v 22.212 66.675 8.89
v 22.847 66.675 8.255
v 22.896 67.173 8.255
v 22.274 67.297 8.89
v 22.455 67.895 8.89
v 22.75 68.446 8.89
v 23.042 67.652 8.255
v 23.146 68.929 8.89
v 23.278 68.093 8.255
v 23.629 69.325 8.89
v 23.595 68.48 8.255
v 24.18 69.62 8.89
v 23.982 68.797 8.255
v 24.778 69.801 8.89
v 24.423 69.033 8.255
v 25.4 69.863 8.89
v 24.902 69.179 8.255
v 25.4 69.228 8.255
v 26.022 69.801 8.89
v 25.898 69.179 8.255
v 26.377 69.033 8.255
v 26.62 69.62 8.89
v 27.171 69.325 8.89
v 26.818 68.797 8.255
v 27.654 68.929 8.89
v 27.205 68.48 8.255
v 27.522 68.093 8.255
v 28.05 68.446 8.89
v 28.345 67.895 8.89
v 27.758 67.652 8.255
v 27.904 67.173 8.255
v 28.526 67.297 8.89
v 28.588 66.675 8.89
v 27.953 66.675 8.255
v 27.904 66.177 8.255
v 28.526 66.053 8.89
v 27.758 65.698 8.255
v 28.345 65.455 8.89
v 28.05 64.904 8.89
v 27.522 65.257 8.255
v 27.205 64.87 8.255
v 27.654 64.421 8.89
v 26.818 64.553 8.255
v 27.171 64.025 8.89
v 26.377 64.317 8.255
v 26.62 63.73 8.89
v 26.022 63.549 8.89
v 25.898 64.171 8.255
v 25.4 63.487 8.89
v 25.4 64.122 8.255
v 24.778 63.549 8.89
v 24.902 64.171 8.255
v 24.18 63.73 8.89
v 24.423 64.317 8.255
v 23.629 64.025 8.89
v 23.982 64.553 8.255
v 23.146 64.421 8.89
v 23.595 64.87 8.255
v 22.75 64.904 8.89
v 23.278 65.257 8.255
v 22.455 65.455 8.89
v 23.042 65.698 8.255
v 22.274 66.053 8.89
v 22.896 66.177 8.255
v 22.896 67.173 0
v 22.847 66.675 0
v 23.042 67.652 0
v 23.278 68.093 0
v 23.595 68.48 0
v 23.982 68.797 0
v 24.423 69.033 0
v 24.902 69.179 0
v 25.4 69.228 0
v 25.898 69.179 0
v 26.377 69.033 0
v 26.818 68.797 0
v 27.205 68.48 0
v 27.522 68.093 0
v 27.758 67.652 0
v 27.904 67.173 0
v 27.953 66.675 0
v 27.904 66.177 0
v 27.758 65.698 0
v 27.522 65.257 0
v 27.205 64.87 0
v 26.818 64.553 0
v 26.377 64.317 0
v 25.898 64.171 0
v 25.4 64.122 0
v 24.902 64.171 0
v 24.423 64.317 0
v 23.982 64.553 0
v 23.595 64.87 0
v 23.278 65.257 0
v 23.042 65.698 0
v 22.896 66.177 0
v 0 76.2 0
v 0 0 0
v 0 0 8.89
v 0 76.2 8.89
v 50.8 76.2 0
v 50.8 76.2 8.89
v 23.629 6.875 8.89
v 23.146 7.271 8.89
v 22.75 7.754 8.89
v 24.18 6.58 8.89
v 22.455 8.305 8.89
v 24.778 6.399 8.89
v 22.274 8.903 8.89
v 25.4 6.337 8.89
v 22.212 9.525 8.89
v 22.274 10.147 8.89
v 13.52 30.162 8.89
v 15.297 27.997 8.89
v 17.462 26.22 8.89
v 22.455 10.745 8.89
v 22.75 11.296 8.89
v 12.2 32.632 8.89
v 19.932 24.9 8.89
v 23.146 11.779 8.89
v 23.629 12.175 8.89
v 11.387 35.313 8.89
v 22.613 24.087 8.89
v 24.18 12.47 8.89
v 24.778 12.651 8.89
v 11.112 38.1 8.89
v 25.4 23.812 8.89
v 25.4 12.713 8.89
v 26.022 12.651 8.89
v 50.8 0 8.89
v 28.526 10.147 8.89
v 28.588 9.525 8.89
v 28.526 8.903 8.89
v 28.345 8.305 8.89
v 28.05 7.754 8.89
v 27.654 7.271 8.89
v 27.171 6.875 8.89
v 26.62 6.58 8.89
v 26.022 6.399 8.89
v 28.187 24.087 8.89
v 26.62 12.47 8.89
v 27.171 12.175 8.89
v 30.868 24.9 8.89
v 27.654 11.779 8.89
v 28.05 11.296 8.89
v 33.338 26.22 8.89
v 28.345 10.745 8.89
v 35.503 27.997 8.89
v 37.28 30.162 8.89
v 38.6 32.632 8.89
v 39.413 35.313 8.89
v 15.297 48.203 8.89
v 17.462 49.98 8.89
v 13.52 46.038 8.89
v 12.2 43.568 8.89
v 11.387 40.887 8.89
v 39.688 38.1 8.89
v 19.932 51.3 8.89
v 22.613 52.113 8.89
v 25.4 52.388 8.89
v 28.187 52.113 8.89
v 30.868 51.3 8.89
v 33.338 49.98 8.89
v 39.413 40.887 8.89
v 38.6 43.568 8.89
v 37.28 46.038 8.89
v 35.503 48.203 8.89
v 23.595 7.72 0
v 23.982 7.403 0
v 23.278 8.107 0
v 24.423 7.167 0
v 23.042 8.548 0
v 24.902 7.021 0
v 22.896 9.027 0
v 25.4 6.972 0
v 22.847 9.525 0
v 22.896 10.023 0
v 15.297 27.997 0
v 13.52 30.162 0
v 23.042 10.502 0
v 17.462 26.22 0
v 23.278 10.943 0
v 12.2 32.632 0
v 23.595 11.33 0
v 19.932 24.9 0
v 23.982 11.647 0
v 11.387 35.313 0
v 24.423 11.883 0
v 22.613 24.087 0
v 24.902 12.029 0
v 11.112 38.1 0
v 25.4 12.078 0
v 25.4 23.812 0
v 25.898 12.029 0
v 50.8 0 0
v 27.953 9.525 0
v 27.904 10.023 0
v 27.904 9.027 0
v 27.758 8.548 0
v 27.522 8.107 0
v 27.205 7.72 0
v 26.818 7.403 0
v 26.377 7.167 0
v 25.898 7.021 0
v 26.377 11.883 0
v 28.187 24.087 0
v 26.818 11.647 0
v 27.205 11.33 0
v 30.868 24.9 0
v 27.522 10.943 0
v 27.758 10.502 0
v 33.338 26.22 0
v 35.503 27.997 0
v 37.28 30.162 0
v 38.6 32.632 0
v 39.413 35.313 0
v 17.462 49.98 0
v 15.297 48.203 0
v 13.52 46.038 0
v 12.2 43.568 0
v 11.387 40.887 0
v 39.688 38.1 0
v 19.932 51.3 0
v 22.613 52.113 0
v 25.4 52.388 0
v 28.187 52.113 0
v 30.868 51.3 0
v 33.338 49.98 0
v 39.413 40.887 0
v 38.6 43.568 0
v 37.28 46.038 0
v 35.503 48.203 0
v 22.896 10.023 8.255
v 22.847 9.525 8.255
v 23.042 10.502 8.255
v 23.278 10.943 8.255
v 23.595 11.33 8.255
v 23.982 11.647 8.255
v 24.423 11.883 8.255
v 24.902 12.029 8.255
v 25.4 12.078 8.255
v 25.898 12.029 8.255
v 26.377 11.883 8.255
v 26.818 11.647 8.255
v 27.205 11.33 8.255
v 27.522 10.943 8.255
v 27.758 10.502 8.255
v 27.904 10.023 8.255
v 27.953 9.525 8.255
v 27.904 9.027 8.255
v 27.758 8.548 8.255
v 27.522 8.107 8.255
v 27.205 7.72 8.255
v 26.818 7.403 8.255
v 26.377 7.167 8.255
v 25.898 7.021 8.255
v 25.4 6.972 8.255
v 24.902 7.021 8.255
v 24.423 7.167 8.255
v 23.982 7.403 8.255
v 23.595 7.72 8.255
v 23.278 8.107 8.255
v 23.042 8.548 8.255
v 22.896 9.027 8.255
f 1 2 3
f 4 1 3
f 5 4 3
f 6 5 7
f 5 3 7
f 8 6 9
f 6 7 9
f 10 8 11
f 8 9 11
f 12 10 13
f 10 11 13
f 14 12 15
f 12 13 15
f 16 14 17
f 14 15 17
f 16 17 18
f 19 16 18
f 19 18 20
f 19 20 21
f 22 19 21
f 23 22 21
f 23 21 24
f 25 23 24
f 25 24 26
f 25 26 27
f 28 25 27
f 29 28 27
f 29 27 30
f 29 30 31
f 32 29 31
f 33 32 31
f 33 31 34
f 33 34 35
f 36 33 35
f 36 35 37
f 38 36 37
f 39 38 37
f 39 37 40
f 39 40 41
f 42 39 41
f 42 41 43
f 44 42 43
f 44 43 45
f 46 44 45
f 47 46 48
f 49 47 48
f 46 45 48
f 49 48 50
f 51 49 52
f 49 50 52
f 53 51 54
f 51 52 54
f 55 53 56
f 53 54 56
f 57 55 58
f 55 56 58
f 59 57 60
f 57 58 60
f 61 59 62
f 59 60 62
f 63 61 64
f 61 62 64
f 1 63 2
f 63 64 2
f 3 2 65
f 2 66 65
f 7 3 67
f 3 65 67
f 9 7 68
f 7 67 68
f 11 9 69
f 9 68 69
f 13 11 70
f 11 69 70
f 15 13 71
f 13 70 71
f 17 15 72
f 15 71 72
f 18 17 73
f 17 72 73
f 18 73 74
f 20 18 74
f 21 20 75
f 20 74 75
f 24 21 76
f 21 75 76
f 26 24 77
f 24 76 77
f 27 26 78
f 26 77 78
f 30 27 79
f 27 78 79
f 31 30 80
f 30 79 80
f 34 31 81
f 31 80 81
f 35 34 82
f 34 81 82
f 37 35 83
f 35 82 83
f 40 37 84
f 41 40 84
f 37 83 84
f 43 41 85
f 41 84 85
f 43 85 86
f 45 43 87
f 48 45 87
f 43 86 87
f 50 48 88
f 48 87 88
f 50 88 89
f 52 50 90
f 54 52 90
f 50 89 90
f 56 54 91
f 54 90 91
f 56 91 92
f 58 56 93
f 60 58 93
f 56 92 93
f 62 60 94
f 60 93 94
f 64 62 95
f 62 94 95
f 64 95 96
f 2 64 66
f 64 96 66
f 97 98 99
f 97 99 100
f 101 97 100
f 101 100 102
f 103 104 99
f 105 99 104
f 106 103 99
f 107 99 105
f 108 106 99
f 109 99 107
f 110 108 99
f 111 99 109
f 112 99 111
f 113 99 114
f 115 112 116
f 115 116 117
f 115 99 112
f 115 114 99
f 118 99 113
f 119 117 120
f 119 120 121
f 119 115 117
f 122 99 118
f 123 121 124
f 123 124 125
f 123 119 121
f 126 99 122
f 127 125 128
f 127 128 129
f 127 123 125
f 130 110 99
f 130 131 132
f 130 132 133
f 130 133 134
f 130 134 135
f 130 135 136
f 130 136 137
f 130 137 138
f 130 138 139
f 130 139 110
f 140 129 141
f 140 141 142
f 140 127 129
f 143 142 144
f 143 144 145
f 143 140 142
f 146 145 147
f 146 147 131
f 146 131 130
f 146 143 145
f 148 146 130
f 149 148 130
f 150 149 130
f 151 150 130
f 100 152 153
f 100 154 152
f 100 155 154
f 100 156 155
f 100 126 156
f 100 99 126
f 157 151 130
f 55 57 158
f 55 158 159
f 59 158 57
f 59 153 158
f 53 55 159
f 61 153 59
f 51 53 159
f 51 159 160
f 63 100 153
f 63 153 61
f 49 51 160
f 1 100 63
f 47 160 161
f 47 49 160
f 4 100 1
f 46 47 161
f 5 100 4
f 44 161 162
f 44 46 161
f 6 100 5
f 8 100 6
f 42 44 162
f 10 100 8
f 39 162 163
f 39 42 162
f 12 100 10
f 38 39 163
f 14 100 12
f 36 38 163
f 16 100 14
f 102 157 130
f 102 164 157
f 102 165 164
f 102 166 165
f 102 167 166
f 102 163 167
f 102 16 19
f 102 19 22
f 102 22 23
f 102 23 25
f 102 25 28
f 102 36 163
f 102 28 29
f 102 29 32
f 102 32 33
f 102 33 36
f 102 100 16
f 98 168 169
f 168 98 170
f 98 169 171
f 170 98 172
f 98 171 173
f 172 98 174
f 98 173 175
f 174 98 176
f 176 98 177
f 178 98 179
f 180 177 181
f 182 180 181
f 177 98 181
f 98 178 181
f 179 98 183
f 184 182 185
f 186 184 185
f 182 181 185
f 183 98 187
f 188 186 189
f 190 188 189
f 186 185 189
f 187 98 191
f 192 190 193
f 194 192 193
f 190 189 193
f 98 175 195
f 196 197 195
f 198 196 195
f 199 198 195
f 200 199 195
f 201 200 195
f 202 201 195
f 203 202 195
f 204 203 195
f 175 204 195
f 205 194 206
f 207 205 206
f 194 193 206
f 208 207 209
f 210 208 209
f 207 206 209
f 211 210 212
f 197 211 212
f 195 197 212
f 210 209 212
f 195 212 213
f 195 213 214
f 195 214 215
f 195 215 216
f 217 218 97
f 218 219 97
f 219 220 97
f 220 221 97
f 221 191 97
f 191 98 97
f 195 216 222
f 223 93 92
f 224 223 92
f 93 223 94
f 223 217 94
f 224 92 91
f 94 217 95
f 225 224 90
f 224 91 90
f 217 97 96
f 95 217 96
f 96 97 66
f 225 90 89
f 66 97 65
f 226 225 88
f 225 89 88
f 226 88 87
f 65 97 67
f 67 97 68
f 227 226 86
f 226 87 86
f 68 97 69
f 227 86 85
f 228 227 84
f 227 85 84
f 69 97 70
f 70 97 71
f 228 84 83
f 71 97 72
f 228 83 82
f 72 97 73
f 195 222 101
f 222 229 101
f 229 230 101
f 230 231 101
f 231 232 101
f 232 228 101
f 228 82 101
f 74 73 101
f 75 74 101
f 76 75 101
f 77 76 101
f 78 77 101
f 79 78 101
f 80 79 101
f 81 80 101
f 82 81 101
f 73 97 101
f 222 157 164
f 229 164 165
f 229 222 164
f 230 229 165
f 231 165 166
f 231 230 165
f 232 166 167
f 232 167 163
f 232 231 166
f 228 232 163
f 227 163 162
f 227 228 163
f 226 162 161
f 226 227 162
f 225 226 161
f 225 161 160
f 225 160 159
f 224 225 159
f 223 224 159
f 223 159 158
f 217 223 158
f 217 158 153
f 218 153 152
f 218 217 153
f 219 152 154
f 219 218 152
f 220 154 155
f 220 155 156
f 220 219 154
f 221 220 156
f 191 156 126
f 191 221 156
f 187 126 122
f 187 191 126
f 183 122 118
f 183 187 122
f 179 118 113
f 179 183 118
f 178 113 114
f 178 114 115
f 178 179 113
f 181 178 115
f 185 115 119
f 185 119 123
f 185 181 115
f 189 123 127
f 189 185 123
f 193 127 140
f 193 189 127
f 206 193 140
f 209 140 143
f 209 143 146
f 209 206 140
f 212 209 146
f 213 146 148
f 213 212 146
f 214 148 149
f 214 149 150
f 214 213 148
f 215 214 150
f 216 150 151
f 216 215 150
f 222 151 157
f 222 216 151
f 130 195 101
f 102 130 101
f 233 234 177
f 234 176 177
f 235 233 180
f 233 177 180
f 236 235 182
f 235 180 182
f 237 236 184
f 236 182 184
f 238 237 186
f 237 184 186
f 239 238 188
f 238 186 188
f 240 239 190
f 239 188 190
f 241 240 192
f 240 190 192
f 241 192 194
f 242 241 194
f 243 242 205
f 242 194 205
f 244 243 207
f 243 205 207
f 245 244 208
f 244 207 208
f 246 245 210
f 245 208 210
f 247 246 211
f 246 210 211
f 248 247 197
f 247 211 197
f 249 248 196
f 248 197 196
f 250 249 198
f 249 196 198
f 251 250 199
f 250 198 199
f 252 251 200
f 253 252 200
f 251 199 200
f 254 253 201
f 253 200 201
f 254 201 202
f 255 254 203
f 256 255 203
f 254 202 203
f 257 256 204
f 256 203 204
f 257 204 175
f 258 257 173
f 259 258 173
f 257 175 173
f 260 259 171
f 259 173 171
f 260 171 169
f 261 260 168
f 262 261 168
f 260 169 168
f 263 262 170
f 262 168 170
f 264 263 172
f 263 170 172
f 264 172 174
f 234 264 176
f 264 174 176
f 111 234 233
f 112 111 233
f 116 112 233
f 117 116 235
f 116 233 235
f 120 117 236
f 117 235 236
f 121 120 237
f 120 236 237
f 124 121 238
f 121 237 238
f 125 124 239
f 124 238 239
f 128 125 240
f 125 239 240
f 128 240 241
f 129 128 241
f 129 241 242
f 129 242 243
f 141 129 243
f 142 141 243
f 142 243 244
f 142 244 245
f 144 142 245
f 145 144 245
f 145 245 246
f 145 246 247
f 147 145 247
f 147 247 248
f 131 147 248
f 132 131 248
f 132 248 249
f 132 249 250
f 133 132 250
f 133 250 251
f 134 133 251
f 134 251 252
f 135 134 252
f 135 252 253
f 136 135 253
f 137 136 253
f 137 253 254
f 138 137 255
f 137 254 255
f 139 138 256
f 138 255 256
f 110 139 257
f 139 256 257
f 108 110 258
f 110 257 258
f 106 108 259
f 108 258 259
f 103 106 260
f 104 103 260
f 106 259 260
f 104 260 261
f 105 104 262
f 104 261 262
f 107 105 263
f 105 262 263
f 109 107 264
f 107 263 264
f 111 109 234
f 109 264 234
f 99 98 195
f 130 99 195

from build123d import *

# Parameters (mm, degrees)
SKETCH1_W                        = 50.8
SKETCH1_H                        = 76.2
SKETCH1_R                        = 14.2875
BOSS_EXTRUDE1_DEPTH              = 8.89
F_10_CLEARANCE_HOLE1_D           = 5.1054
F_10_CLEARANCE_HOLE1_CSINK_D     = 6.3754
F_10_CLEARANCE_HOLE1_CSINK_ANGLE = 90


with BuildPart() as part:
    # Sketch1 → Boss-Extrude1 (new body)
    with BuildSketch(Plane.XY):
        with Locations((25.4, 38.1)):
            Rectangle(SKETCH1_W, SKETCH1_H)
        with Locations((25.4, 38.1)):
            Circle(SKETCH1_R, mode=Mode.SUBTRACT)
    extrude(amount=BOSS_EXTRUDE1_DEPTH)

    # #10 Clearance Hole1 (through all)
    with Locations(Plane.XY.offset(8.89)):
        with Locations((25.4, 66.675), (25.4, 9.525)):
            CounterSinkHole(F_10_CLEARANCE_HOLE1_D / 2, F_10_CLEARANCE_HOLE1_CSINK_D / 2, counter_sink_angle=F_10_CLEARANCE_HOLE1_CSINK_ANGLE)


solid = part.part
